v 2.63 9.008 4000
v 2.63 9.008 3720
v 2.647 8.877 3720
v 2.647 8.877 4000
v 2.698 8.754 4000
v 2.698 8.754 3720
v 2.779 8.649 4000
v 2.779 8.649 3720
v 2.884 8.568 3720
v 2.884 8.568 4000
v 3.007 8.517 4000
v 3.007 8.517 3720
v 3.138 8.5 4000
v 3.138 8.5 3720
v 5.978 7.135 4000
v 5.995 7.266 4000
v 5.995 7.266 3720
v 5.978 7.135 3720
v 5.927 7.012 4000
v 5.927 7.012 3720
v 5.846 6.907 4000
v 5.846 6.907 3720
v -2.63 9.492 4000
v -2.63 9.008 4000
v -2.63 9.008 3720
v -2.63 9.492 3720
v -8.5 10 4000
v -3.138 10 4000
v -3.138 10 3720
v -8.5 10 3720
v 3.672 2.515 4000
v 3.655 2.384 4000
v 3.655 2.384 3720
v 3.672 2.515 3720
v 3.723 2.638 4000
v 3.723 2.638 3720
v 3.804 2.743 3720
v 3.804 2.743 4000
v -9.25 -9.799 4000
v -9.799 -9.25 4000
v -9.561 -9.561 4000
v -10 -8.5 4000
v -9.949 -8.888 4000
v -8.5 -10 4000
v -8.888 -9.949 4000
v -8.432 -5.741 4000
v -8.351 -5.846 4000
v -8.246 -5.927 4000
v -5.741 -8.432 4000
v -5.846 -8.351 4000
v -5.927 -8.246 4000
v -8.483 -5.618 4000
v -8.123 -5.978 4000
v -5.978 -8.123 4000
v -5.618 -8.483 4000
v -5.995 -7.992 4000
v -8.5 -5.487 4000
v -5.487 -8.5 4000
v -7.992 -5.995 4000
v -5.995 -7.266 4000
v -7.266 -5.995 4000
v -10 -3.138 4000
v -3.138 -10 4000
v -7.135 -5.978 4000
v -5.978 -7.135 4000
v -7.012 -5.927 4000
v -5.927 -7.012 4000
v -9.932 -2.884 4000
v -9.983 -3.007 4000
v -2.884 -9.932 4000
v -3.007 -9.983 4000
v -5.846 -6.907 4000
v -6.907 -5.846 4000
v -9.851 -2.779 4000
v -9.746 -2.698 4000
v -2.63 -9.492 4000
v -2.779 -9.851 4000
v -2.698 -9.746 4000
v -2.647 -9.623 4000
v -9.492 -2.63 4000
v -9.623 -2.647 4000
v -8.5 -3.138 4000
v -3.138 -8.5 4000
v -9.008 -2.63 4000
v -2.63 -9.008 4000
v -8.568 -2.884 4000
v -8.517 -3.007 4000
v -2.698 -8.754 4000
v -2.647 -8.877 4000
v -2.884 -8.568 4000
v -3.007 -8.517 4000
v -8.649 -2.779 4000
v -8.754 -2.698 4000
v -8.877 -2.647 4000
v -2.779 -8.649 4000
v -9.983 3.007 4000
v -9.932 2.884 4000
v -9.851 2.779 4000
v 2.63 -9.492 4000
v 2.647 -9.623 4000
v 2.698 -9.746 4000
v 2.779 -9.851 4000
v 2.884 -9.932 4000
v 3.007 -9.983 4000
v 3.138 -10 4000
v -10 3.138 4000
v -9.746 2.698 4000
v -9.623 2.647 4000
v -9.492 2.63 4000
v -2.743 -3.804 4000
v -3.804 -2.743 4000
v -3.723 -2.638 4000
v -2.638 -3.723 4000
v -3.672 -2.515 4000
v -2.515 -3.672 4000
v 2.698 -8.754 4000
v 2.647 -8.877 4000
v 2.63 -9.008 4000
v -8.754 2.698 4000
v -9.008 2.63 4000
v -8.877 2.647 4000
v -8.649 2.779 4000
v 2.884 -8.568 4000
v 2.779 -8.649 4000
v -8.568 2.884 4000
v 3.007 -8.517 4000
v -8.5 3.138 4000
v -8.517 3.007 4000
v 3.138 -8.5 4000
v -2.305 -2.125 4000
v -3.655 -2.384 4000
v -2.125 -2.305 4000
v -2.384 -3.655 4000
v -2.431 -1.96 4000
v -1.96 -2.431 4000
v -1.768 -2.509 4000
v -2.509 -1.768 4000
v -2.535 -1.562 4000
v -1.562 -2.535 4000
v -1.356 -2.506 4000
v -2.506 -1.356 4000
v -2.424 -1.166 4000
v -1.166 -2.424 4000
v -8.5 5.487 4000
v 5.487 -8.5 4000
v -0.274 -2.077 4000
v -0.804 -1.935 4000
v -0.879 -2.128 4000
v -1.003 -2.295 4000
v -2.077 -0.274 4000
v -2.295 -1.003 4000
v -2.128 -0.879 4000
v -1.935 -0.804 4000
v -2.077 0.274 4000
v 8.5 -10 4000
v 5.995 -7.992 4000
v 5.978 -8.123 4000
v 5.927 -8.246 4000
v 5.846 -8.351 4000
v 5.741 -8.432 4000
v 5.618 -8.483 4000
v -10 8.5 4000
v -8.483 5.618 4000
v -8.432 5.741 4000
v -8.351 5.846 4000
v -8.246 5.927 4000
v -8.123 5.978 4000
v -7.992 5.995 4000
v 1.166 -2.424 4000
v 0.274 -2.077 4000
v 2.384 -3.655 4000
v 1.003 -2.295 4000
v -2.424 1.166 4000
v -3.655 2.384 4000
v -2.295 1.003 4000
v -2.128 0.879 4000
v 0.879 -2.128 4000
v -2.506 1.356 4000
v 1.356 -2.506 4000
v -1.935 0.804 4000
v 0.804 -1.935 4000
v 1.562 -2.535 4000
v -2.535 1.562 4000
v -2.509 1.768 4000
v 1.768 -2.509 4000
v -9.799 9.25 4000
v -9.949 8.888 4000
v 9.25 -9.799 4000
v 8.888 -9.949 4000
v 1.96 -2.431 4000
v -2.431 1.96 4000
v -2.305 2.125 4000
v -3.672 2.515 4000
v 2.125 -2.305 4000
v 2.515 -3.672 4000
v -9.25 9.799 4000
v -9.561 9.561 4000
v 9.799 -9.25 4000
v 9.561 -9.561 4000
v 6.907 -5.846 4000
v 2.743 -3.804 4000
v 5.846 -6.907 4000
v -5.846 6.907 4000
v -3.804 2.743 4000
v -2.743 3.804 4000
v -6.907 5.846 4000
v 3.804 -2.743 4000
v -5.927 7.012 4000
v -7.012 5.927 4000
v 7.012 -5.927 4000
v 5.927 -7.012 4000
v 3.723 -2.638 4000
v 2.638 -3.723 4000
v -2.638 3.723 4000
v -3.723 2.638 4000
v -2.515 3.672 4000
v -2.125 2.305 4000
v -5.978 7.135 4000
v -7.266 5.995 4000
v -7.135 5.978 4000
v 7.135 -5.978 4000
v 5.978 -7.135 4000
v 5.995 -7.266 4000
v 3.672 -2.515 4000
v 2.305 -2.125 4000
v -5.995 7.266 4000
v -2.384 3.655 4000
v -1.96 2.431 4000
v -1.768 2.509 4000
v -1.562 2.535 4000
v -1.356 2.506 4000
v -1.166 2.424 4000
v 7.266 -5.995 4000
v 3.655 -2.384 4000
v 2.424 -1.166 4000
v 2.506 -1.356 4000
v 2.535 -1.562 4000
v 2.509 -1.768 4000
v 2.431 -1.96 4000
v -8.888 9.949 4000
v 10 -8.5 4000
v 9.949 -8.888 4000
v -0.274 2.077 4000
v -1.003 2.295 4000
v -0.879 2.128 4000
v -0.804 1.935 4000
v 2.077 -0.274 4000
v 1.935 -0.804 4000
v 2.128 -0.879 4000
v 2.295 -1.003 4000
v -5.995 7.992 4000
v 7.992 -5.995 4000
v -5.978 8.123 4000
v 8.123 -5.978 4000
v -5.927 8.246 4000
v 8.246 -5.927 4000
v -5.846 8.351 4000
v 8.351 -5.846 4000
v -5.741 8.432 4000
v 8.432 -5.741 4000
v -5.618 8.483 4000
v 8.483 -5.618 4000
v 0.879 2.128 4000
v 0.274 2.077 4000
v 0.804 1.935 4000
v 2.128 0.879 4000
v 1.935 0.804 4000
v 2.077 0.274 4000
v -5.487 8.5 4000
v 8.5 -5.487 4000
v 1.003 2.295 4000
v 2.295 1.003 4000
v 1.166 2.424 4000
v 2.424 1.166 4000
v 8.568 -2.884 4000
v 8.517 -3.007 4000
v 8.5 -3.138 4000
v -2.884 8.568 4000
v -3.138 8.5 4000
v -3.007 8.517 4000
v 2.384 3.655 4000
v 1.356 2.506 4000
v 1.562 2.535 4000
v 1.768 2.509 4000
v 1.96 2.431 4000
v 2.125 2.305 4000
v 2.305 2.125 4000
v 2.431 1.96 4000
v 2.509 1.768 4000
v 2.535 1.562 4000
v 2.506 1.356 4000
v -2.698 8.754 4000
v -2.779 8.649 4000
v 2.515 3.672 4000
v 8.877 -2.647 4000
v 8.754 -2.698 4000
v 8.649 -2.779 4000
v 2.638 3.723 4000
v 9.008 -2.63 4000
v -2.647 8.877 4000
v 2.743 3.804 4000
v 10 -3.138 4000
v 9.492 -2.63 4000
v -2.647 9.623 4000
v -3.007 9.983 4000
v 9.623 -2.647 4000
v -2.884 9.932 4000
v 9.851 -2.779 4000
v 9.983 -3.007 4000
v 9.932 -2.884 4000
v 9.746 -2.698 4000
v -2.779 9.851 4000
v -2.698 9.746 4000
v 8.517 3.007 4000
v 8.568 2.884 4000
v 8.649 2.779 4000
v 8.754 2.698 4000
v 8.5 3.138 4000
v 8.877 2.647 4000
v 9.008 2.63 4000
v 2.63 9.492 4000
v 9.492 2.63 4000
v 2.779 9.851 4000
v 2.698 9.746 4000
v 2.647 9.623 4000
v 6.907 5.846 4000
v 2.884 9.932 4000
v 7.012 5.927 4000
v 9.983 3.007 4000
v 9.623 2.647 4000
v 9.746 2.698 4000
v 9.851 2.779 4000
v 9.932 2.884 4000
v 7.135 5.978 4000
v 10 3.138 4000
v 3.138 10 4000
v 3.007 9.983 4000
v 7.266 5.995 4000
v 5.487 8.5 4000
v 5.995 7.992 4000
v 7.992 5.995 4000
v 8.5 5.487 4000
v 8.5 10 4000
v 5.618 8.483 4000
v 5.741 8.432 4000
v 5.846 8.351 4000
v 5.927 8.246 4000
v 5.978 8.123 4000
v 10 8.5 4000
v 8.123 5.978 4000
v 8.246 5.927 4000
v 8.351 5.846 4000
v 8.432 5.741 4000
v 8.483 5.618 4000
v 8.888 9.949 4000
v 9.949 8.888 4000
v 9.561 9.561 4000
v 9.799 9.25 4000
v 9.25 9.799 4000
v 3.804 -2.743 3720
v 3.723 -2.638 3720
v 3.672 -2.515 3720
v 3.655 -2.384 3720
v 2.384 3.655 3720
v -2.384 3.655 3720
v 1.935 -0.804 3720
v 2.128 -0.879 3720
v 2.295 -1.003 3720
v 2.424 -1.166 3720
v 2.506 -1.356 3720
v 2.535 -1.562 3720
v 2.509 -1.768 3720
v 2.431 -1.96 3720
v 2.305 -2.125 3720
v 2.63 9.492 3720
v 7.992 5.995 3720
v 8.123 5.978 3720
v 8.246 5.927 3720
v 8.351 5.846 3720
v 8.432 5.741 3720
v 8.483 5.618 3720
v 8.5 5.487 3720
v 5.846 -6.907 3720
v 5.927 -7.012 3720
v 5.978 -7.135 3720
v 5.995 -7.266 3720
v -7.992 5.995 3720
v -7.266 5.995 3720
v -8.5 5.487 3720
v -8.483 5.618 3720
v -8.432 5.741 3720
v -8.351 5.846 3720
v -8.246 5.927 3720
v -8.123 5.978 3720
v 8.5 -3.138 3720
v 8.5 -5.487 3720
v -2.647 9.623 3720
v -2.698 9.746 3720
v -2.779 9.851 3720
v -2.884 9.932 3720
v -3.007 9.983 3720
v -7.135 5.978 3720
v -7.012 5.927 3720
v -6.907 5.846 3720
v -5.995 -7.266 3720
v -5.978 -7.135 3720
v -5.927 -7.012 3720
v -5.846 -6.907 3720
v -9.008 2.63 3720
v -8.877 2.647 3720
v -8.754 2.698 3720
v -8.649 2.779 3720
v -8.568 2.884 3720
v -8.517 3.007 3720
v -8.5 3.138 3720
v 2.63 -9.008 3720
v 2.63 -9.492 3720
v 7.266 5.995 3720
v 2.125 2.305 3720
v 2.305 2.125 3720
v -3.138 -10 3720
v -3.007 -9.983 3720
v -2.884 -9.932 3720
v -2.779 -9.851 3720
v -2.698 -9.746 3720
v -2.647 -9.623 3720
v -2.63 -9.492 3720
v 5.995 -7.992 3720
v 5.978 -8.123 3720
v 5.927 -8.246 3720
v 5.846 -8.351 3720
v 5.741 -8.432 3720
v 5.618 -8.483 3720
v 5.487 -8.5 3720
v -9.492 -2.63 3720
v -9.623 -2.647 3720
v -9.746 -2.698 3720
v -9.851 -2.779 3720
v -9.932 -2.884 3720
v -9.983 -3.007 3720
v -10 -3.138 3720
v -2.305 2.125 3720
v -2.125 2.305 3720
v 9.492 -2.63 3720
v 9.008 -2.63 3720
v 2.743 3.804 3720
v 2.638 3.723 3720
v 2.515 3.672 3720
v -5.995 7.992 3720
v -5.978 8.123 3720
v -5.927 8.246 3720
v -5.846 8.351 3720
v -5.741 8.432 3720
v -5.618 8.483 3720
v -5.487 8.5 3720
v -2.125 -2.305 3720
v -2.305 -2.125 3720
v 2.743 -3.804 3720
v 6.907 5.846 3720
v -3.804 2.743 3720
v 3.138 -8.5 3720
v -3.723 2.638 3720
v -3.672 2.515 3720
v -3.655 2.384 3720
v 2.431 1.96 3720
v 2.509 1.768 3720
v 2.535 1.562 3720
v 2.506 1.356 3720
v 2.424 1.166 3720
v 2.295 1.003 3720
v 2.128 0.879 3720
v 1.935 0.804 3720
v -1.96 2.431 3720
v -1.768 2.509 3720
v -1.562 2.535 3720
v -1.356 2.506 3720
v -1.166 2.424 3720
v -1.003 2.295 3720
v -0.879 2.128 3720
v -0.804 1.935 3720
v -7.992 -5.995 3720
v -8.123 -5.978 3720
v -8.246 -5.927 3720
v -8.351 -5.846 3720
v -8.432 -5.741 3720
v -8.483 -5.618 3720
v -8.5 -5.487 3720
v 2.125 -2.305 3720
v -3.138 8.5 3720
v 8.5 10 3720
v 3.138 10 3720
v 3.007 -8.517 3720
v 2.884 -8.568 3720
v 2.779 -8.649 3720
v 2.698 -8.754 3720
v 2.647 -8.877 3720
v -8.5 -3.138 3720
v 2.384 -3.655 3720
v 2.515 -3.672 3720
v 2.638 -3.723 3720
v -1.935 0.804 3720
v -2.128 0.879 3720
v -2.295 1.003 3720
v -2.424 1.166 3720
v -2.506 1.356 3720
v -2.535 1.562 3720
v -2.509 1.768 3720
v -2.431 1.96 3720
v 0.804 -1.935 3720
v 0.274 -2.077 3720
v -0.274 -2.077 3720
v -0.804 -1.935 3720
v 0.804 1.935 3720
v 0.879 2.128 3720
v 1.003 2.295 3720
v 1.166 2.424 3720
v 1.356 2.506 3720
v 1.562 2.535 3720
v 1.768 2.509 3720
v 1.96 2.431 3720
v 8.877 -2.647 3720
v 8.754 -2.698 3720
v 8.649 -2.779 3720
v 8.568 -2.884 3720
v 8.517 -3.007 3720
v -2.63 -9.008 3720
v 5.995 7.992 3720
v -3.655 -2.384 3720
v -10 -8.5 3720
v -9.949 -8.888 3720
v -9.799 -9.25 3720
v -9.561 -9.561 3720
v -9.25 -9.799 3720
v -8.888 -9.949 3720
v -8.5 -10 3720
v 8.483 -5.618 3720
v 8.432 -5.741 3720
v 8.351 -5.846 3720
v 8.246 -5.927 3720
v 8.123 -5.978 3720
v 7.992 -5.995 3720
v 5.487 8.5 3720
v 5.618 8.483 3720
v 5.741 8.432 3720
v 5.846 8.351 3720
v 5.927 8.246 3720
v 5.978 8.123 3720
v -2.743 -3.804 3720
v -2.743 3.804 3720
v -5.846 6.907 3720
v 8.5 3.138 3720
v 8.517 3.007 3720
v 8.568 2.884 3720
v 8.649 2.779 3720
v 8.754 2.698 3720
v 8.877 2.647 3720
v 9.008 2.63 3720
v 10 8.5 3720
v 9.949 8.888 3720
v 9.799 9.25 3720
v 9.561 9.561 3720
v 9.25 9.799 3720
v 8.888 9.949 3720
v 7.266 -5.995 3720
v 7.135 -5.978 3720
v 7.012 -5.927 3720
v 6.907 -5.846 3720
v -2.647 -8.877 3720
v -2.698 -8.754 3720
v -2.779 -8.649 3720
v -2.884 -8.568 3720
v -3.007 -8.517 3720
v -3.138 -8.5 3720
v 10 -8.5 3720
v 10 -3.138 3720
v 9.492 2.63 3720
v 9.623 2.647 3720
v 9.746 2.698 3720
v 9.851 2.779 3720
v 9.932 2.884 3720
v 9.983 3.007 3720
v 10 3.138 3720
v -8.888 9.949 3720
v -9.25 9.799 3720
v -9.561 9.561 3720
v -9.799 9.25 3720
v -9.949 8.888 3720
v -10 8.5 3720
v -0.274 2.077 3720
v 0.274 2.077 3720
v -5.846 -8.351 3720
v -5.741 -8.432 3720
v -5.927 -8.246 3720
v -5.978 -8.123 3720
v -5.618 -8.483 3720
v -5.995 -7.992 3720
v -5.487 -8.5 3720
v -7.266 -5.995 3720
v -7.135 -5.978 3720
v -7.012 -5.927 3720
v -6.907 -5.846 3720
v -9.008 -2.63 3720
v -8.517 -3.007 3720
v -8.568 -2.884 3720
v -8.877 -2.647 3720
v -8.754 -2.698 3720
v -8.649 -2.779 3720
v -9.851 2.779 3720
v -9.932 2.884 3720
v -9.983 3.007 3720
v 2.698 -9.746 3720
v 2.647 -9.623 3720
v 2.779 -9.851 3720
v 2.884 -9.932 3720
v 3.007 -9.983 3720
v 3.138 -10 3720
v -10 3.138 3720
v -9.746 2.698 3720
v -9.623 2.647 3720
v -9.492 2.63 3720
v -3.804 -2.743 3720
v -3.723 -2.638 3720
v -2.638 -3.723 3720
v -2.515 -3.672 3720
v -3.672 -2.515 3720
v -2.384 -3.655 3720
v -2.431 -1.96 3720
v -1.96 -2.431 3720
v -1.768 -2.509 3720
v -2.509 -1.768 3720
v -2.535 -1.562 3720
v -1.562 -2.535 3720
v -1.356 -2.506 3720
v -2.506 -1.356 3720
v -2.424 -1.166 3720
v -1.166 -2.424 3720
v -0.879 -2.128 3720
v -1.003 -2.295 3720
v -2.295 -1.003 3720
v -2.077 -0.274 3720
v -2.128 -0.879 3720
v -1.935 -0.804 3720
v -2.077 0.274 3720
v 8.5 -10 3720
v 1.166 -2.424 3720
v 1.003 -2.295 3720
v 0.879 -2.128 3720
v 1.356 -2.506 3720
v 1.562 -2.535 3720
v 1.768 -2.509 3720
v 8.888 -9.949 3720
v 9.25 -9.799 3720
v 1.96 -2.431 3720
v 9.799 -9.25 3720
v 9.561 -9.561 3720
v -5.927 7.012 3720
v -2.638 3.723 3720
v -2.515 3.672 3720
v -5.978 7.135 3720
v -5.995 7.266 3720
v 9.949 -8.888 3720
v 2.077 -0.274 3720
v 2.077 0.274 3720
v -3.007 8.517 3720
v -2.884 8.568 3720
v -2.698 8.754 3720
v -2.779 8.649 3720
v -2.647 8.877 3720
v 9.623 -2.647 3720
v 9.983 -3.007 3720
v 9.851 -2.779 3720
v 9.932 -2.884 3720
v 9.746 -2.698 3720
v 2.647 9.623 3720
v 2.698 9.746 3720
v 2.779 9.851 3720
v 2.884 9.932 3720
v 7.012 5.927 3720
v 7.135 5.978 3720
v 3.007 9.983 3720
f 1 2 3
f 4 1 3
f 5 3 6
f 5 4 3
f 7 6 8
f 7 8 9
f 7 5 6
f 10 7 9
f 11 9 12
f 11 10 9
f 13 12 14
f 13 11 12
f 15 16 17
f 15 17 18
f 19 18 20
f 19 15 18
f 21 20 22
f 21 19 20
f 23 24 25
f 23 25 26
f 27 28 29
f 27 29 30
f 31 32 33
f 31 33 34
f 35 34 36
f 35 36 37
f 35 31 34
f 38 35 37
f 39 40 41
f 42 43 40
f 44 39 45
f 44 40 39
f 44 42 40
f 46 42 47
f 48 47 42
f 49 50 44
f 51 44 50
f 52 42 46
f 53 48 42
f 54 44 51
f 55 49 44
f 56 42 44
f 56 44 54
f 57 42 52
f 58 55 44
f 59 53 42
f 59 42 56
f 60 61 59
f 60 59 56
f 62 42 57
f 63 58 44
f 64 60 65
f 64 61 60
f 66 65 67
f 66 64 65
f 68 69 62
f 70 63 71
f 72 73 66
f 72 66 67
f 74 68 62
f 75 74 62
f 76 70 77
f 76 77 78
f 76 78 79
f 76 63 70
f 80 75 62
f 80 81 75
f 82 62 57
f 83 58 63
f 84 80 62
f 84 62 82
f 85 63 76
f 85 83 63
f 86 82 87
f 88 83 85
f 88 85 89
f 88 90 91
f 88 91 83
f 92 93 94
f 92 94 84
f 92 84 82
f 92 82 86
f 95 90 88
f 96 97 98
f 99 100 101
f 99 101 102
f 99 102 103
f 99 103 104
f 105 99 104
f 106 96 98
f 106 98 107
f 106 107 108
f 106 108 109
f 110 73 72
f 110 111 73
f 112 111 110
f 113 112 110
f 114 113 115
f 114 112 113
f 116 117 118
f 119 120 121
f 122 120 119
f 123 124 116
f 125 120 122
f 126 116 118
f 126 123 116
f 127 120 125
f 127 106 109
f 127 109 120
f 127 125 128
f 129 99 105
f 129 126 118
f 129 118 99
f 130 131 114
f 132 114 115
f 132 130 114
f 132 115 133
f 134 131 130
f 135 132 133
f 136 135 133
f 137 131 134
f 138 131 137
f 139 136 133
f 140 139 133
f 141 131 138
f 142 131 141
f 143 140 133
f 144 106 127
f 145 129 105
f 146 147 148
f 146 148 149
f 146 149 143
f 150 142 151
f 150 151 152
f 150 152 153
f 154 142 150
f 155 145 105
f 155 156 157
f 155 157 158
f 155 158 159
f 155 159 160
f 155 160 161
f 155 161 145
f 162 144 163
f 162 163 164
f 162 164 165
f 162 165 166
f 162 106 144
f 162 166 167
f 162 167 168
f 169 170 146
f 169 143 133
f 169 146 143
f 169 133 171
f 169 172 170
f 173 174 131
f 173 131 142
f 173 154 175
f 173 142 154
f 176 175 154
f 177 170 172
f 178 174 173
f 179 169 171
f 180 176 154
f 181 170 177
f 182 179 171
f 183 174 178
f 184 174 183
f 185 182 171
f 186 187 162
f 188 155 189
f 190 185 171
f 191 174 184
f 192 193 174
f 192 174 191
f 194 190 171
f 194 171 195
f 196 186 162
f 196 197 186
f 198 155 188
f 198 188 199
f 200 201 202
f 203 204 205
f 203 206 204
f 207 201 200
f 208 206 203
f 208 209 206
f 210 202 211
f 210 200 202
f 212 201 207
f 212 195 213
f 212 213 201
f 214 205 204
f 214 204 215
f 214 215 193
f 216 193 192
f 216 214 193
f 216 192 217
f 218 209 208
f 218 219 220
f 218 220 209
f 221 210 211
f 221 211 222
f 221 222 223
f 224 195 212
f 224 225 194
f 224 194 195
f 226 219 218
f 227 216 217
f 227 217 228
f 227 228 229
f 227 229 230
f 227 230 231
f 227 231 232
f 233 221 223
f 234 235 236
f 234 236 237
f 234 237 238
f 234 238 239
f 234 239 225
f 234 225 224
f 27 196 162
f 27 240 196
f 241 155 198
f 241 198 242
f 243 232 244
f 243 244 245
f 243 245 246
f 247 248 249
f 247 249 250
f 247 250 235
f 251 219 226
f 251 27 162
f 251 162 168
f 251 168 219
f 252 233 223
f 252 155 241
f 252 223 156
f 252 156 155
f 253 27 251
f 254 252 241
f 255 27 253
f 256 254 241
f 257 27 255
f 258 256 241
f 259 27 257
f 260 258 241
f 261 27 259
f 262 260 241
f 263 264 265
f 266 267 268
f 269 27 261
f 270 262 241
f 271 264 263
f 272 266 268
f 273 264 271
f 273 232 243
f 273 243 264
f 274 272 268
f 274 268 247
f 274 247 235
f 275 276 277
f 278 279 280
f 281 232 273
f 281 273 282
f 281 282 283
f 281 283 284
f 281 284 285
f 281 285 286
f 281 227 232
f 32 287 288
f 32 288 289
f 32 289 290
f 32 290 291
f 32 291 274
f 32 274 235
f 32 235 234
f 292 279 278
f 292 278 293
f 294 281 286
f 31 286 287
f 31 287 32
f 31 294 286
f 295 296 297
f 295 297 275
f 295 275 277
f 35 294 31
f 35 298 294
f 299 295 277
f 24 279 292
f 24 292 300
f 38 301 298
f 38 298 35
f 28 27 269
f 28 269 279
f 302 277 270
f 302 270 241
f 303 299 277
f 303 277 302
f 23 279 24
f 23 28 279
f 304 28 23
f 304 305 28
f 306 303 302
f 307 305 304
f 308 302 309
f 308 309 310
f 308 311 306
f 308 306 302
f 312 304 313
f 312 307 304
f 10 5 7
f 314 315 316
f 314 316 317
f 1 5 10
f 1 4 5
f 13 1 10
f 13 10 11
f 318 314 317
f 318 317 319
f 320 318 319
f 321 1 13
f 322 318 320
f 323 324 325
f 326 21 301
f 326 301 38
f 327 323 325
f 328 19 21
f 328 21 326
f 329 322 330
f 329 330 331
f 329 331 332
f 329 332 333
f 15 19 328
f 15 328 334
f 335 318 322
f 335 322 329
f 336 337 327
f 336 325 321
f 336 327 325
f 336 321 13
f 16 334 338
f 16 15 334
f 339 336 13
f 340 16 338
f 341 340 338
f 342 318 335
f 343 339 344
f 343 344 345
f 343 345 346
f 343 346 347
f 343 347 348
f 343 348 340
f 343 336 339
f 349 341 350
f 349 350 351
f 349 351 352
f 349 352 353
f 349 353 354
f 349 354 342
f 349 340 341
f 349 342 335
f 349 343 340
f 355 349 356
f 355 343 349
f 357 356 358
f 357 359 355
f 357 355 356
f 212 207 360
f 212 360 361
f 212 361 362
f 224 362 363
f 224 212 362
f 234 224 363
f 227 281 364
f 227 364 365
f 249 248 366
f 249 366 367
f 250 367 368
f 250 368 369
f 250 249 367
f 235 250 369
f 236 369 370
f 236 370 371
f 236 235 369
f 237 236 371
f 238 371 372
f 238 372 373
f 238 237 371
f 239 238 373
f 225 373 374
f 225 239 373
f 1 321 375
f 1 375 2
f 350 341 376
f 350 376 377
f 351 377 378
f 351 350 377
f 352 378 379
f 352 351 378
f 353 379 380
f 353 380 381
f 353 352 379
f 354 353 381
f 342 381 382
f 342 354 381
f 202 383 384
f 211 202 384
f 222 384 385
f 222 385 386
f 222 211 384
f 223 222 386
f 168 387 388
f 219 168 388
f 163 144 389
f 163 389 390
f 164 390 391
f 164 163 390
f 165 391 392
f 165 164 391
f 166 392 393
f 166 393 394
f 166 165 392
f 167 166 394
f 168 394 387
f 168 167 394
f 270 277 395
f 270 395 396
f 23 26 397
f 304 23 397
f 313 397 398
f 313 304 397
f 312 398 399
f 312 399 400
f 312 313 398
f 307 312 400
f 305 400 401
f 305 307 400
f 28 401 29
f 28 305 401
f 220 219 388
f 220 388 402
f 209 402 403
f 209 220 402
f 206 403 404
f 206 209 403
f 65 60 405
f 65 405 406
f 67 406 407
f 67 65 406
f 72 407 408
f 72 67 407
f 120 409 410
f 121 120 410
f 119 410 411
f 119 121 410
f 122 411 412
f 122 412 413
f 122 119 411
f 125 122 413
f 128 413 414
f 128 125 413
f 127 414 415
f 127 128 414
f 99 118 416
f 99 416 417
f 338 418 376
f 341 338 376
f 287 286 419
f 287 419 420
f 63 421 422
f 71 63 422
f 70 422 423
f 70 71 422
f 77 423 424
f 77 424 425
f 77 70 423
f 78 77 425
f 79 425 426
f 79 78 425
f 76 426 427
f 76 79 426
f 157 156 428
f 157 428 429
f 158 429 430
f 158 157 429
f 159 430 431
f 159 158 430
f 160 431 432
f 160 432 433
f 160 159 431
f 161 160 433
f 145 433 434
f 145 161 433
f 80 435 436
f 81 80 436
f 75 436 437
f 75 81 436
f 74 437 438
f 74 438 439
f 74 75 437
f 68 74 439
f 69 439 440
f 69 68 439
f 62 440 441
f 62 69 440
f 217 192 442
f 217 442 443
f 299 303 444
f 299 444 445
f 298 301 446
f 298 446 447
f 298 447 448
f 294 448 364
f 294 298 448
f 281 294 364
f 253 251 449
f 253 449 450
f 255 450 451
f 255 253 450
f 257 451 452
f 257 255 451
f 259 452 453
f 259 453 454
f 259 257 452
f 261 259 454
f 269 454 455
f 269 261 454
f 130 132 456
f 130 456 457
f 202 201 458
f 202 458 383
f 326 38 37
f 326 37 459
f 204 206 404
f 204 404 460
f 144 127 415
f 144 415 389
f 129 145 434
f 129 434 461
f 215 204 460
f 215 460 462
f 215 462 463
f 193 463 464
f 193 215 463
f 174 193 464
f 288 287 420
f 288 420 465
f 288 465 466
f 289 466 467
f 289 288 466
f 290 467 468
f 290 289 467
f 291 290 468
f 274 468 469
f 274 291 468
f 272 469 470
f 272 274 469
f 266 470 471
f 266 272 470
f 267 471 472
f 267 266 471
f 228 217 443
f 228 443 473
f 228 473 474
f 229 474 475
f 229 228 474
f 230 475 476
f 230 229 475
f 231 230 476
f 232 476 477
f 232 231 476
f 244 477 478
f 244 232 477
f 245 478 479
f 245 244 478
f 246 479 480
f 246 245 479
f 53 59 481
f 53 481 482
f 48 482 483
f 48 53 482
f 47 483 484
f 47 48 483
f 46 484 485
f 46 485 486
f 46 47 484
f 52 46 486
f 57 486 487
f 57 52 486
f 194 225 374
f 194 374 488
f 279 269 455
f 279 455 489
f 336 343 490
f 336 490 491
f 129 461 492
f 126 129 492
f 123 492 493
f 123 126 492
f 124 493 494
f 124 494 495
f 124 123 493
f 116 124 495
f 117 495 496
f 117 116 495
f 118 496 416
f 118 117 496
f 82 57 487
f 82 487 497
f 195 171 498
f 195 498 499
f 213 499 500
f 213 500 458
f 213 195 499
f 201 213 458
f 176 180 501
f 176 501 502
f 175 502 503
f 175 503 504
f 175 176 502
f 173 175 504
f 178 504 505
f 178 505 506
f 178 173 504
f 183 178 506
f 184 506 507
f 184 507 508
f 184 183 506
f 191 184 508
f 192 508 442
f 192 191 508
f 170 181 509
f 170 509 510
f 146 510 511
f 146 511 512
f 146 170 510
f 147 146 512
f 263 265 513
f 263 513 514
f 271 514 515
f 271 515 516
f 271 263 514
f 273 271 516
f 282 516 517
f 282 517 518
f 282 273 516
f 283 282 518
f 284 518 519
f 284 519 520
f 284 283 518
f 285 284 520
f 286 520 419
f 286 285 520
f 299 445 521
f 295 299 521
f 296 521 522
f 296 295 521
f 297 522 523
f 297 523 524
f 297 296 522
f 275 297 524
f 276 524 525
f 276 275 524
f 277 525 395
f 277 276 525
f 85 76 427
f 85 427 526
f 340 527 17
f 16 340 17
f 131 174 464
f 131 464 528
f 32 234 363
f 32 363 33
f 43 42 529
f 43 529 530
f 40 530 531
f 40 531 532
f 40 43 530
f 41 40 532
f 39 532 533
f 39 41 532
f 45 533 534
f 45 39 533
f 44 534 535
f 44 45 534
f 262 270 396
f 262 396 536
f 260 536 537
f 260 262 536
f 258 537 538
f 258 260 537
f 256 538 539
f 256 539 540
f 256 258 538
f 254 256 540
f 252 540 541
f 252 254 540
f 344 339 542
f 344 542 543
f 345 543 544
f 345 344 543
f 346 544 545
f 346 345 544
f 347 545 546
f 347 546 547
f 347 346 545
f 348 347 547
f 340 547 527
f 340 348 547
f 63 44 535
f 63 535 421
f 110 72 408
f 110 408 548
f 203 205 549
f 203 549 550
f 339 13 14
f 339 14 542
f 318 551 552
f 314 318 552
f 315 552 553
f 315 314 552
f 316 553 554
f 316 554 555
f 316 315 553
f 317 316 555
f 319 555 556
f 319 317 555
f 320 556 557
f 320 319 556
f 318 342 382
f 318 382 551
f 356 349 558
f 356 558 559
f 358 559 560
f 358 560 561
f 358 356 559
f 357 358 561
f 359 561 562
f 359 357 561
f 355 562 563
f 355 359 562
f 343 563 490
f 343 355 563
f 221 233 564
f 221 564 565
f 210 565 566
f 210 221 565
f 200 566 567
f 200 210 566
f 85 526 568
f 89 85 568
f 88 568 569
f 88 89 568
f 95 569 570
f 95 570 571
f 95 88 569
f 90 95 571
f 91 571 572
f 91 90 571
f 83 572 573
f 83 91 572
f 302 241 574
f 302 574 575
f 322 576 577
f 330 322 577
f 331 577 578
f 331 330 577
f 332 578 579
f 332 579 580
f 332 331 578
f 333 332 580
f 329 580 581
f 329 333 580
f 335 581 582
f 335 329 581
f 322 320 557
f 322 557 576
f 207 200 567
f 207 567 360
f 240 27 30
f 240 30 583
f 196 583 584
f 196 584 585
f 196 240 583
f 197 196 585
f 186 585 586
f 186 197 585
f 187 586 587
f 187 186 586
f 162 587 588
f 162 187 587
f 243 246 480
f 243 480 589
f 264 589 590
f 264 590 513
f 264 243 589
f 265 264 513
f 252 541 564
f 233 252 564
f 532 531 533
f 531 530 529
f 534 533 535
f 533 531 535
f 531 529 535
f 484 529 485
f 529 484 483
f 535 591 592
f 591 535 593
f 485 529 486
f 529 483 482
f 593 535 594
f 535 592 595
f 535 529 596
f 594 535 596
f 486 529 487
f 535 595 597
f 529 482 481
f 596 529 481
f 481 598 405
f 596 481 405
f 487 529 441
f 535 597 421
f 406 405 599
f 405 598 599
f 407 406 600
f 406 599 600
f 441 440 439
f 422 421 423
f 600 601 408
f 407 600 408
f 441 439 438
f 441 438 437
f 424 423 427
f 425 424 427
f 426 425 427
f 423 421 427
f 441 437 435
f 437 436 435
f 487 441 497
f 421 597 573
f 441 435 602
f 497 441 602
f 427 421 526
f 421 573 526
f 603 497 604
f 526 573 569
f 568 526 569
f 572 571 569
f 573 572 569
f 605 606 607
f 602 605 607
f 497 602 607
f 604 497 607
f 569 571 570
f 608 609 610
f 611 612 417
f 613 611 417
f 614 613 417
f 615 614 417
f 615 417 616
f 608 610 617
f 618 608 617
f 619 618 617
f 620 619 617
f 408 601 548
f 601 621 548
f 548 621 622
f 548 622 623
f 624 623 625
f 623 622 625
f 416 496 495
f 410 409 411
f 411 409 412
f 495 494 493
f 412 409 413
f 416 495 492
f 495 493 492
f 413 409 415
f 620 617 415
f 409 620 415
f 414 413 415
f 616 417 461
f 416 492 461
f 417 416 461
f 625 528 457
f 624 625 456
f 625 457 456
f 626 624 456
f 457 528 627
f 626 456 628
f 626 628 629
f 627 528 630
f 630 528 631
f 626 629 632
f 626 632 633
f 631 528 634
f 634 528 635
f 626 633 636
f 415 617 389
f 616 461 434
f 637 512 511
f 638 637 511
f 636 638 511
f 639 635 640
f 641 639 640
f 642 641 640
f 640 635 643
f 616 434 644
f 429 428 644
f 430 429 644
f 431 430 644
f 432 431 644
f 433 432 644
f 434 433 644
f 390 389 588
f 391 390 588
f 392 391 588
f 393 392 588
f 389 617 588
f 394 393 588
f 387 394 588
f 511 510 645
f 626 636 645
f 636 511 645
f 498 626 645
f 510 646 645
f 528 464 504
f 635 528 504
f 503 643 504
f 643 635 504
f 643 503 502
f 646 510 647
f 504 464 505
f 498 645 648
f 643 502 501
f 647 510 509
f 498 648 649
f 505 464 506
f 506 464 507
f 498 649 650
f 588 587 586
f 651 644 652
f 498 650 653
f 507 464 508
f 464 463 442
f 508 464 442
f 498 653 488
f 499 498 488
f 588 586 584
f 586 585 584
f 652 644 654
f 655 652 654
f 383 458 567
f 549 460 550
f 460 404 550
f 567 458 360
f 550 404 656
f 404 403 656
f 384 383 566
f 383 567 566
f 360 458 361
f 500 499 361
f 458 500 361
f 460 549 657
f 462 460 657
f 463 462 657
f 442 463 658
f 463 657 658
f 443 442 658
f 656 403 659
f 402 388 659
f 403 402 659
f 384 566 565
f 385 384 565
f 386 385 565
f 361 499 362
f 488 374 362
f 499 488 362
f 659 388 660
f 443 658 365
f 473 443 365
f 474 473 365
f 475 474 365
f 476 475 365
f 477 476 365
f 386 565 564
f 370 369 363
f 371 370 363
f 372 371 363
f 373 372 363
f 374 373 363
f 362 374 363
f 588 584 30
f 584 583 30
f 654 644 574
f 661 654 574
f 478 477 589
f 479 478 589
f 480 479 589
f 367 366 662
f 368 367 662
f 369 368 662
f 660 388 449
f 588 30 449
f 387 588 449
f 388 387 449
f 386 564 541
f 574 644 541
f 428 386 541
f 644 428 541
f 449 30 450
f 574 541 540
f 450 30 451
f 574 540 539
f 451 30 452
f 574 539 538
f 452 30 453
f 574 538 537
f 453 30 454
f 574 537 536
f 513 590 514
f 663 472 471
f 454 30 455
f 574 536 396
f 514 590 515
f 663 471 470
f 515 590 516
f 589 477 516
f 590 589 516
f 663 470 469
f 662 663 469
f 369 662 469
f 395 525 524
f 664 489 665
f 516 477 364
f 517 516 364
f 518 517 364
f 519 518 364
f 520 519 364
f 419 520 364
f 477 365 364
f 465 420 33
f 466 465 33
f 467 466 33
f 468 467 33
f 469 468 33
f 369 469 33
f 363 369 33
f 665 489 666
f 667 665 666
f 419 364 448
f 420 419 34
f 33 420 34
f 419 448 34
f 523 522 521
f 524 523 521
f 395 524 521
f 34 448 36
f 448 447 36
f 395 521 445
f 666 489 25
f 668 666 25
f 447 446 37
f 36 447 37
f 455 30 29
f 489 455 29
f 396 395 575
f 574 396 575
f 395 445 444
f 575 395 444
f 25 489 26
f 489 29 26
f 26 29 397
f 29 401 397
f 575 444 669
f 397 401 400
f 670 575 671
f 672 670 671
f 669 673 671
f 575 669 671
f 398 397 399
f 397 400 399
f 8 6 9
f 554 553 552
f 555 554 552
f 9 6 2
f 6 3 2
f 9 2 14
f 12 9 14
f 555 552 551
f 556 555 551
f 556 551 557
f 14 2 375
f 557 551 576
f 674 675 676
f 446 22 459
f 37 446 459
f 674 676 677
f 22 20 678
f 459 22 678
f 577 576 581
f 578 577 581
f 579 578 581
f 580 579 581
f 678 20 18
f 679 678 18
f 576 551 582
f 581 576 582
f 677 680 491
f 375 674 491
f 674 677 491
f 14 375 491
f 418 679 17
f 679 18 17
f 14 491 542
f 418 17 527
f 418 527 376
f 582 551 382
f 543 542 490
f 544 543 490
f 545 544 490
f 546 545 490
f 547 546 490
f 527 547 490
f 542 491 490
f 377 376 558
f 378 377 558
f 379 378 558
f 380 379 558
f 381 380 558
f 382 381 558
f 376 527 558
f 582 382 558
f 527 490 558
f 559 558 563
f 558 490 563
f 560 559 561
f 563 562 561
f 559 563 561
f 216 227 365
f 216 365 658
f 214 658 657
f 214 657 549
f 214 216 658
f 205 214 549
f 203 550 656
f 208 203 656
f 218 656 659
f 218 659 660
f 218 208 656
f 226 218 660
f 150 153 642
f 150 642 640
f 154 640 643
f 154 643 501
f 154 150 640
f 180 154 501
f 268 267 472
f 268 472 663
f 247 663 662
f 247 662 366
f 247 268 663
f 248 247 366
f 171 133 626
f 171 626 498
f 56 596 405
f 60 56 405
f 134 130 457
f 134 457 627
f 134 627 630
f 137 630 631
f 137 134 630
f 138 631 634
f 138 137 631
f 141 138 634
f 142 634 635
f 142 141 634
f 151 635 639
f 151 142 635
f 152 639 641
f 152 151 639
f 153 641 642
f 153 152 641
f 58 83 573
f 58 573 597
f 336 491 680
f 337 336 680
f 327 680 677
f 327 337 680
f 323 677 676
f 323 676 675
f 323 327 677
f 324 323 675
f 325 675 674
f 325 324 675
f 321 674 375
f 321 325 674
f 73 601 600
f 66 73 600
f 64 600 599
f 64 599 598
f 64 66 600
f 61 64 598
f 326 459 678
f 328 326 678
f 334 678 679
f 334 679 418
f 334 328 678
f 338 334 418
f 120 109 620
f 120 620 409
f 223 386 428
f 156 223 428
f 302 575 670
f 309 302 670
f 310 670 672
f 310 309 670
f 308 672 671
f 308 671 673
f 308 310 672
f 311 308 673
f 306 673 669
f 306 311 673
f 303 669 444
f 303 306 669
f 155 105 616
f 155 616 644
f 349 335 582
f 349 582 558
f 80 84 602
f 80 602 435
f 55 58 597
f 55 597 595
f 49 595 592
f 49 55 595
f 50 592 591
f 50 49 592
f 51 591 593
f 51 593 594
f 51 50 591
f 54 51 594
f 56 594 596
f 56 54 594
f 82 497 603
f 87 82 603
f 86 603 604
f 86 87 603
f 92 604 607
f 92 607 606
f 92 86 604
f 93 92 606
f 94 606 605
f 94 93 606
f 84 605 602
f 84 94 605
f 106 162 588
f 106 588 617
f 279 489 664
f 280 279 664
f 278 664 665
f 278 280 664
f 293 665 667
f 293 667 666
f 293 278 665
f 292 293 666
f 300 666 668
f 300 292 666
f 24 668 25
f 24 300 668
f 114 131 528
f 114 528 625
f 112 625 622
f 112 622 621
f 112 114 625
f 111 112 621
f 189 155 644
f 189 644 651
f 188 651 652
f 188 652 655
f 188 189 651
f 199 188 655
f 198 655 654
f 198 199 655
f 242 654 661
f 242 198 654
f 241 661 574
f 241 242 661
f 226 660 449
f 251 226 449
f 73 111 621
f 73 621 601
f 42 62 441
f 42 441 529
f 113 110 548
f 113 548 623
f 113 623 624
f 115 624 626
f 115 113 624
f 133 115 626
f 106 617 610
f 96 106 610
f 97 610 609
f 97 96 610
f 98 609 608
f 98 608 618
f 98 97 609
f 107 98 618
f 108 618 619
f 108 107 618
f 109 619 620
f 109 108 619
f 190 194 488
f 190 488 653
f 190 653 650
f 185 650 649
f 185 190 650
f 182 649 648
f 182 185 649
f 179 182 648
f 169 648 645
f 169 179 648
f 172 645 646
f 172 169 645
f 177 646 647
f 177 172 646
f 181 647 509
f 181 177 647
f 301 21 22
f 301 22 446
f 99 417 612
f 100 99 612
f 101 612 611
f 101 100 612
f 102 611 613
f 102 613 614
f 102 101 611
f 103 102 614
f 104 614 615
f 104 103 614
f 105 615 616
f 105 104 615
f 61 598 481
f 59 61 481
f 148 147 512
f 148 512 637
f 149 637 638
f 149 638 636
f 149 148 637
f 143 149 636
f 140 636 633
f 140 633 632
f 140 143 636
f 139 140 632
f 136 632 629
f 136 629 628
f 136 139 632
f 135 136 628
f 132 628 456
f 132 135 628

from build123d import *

# Parameters (mm, degrees)
BOSS_EXTRUDE1_DEPTH = 280


with BuildPart() as part:
    # Sketch1 → Boss-Extrude1 (new body)
    with BuildSketch(Plane.XY.offset(4000)):
        with BuildLine():
            Line((10, 3.138), (10, 8.5))
            ThreePointArc((10, 8.5), (9.560660172, 9.560660172), (8.5, 10))
            Line((8.5, 10), (3.138, 10))
            ThreePointArc((3.138, 10), (2.778789755, 9.851210245), (2.63, 9.492))
            Line((2.63, 9.492), (2.63, 9.008))
            ThreePointArc((2.63, 9.008), (2.778789755, 8.648789755), (3.138, 8.5))
            Line((3.138, 8.5), (5.487, 8.5))
            ThreePointArc((5.487, 8.5), (5.846210245, 8.351210245), (5.995, 7.992))
            Line((5.995, 7.992), (5.995, 7.266080661))
            ThreePointArc((5.995, 7.266080661), (5.956330803, 7.071677478), (5.846210245, 6.906870417))
            Line((5.846210245, 6.906870417), (2.743129583, 3.803789755))
            ThreePointArc((2.743129583, 3.803789755), (2.578322522, 3.693669197), (2.383919339, 3.655))
            Line((2.383919339, 3.655), (-2.383919339, 3.655))
            ThreePointArc((-2.383919339, 3.655), (-2.578322522, 3.693669197), (-2.743129583, 3.803789755))
            Line((-2.743129583, 3.803789755), (-5.846210245, 6.906870417))
            ThreePointArc((-5.846210245, 6.906870417), (-5.956330803, 7.071677478), (-5.995, 7.266080661))
            Line((-5.995, 7.266080661), (-5.995, 7.992))
            ThreePointArc((-5.995, 7.992), (-5.846210245, 8.351210245), (-5.487, 8.5))
            Line((-5.487, 8.5), (-3.138, 8.5))
            ThreePointArc((-3.138, 8.5), (-2.778789755, 8.648789755), (-2.63, 9.008))
            Line((-2.63, 9.008), (-2.63, 9.492))
            ThreePointArc((-2.63, 9.492), (-2.778789755, 9.851210245), (-3.138, 10))
            Line((-3.138, 10), (-8.5, 10))
            ThreePointArc((-8.5, 10), (-9.560660172, 9.560660172), (-10, 8.5))
            Line((-10, 8.5), (-10, 3.138))
            ThreePointArc((-10, 3.138), (-9.851210245, 2.778789755), (-9.492, 2.63))
            Line((-9.492, 2.63), (-9.008, 2.63))
            ThreePointArc((-9.008, 2.63), (-8.648789755, 2.778789755), (-8.5, 3.138))
            Line((-8.5, 3.138), (-8.5, 5.487))
            ThreePointArc((-8.5, 5.487), (-8.351210245, 5.846210245), (-7.992, 5.995))
            Line((-7.992, 5.995), (-7.266080661, 5.995))
            ThreePointArc((-7.266080661, 5.995), (-7.071677478, 5.956330803), (-6.906870417, 5.846210245))
            Line((-6.906870417, 5.846210245), (-3.803789755, 2.743129583))
            ThreePointArc((-3.803789755, 2.743129583), (-3.693669197, 2.578322522), (-3.655, 2.383919339))
            Line((-3.655, 2.383919339), (-3.655, -2.383919339))
            ThreePointArc((-3.655, -2.383919339), (-3.693669197, -2.578322522), (-3.803789755, -2.743129583))
            Line((-3.803789755, -2.743129583), (-6.906870417, -5.846210245))
            ThreePointArc((-6.906870417, -5.846210245), (-7.071677478, -5.956330803), (-7.266080661, -5.995))
            Line((-7.266080661, -5.995), (-7.992, -5.995))
            ThreePointArc((-7.992, -5.995), (-8.351210245, -5.846210245), (-8.5, -5.487))
            Line((-8.5, -5.487), (-8.5, -3.138))
            ThreePointArc((-8.5, -3.138), (-8.648789755, -2.778789755), (-9.008, -2.63))
            Line((-9.008, -2.63), (-9.492, -2.63))
            ThreePointArc((-9.492, -2.63), (-9.851210245, -2.778789755), (-10, -3.138))
            Line((-10, -3.138), (-10, -8.5))
            ThreePointArc((-10, -8.5), (-9.560660172, -9.560660172), (-8.5, -10))
            Line((-8.5, -10), (-3.138, -10))
            ThreePointArc((-3.138, -10), (-2.778789755, -9.851210245), (-2.63, -9.492))
            Line((-2.63, -9.492), (-2.63, -9.008))
            ThreePointArc((-2.63, -9.008), (-2.778789755, -8.648789755), (-3.138, -8.5))
            Line((-3.138, -8.5), (-5.487, -8.5))
            ThreePointArc((-5.487, -8.5), (-5.846210245, -8.351210245), (-5.995, -7.992))
            Line((-5.995, -7.992), (-5.995, -7.266080661))
            ThreePointArc((-5.995, -7.266080661), (-5.956330803, -7.071677478), (-5.846210245, -6.906870417))
            Line((-5.846210245, -6.906870417), (-2.743129583, -3.803789755))
            ThreePointArc((-2.743129583, -3.803789755), (-2.578322522, -3.693669197), (-2.383919339, -3.655))
            Line((-2.383919339, -3.655), (2.383919339, -3.655))
            ThreePointArc((2.383919339, -3.655), (2.578322522, -3.693669197), (2.743129583, -3.803789755))
            Line((2.743129583, -3.803789755), (5.846210245, -6.906870417))
            ThreePointArc((5.846210245, -6.906870417), (5.956330803, -7.071677478), (5.995, -7.266080661))
            Line((5.995, -7.266080661), (5.995, -7.992))
            ThreePointArc((5.995, -7.992), (5.846210245, -8.351210245), (5.487, -8.5))
            Line((5.487, -8.5), (3.138, -8.5))
            ThreePointArc((3.138, -8.5), (2.778789755, -8.648789755), (2.63, -9.008))
            Line((2.63, -9.008), (2.63, -9.492))
            ThreePointArc((2.63, -9.492), (2.778789755, -9.851210245), (3.138, -10))
            Line((3.138, -10), (8.5, -10))
            ThreePointArc((8.5, -10), (9.560660172, -9.560660172), (10, -8.5))
            Line((10, -8.5), (10, -3.138))
            ThreePointArc((10, -3.138), (9.851210245, -2.778789755), (9.492, -2.63))
            Line((9.492, -2.63), (9.008, -2.63))
            ThreePointArc((9.008, -2.63), (8.648789755, -2.778789755), (8.5, -3.138))
            Line((8.5, -3.138), (8.5, -5.487))
            ThreePointArc((8.5, -5.487), (8.351210245, -5.846210245), (7.992, -5.995))
            Line((7.992, -5.995), (7.266080661, -5.995))
            ThreePointArc((7.266080661, -5.995), (7.071677478, -5.956330803), (6.906870417, -5.846210245))
            Line((6.906870417, -5.846210245), (3.803789755, -2.743129583))
            ThreePointArc((3.803789755, -2.743129583), (3.693669197, -2.578322522), (3.655, -2.383919339))
            Line((3.655, -2.383919339), (3.655, 2.383919339))
            ThreePointArc((3.655, 2.383919339), (3.693669197, 2.578322522), (3.803789755, 2.743129583))
            Line((3.803789755, 2.743129583), (6.906870417, 5.846210245))
            ThreePointArc((6.906870417, 5.846210245), (7.071677478, 5.956330803), (7.266080661, 5.995))
            Line((7.266080661, 5.995), (7.992, 5.995))
            ThreePointArc((7.992, 5.995), (8.351210245, 5.846210245), (8.5, 5.487))
            Line((8.5, 5.487), (8.5, 3.138))
            ThreePointArc((8.5, 3.138), (8.648789755, 2.778789755), (9.008, 2.63))
            Line((9.008, 2.63), (9.492, 2.63))
            ThreePointArc((9.492, 2.63), (9.851210245, 2.778789755), (10, 3.138))
        make_face()
        with BuildLine():
            Line((-2.124900844, -2.304505966), (-2.304505966, -2.124900844))
            ThreePointArc((-2.304505966, -2.124900844), (-2.505938017, -1.356467811), (-1.935133506, -0.803976718))
            ThreePointArc((-1.935133506, -0.803976718), (-2.0955, 0), (-1.935133506, 0.803976718))
            ThreePointArc((-1.935133506, 0.803976718), (-2.505938017, 1.356467811), (-2.304505966, 2.124900844))
            Line((-2.304505966, 2.124900844), (-2.124900844, 2.304505966))
            ThreePointArc((-2.124900844, 2.304505966), (-1.356467811, 2.505938017), (-0.803976718, 1.935133506))
            ThreePointArc((-0.803976718, 1.935133506), (0, 2.0955), (0.803976718, 1.935133506))
            ThreePointArc((0.803976718, 1.935133506), (1.356467811, 2.505938017), (2.124900844, 2.304505966))
            Line((2.124900844, 2.304505966), (2.304505966, 2.124900844))
            ThreePointArc((2.304505966, 2.124900844), (2.505938017, 1.356467811), (1.935133506, 0.803976718))
            ThreePointArc((1.935133506, 0.803976718), (2.0955, 0), (1.935133506, -0.803976718))
            ThreePointArc((1.935133506, -0.803976718), (2.505938017, -1.356467811), (2.304505966, -2.124900844))
            Line((2.304505966, -2.124900844), (2.124900844, -2.304505966))
            ThreePointArc((2.124900844, -2.304505966), (1.356467811, -2.505938017), (0.803976718, -1.935133506))
            ThreePointArc((0.803976718, -1.935133506), (0, -2.0955), (-0.803976718, -1.935133506))
            ThreePointArc((-0.803976718, -1.935133506), (-1.356467811, -2.505938017), (-2.124900844, -2.304505966))
        make_face(mode=Mode.SUBTRACT)
    extrude(amount=-BOSS_EXTRUDE1_DEPTH)


solid = part.part
